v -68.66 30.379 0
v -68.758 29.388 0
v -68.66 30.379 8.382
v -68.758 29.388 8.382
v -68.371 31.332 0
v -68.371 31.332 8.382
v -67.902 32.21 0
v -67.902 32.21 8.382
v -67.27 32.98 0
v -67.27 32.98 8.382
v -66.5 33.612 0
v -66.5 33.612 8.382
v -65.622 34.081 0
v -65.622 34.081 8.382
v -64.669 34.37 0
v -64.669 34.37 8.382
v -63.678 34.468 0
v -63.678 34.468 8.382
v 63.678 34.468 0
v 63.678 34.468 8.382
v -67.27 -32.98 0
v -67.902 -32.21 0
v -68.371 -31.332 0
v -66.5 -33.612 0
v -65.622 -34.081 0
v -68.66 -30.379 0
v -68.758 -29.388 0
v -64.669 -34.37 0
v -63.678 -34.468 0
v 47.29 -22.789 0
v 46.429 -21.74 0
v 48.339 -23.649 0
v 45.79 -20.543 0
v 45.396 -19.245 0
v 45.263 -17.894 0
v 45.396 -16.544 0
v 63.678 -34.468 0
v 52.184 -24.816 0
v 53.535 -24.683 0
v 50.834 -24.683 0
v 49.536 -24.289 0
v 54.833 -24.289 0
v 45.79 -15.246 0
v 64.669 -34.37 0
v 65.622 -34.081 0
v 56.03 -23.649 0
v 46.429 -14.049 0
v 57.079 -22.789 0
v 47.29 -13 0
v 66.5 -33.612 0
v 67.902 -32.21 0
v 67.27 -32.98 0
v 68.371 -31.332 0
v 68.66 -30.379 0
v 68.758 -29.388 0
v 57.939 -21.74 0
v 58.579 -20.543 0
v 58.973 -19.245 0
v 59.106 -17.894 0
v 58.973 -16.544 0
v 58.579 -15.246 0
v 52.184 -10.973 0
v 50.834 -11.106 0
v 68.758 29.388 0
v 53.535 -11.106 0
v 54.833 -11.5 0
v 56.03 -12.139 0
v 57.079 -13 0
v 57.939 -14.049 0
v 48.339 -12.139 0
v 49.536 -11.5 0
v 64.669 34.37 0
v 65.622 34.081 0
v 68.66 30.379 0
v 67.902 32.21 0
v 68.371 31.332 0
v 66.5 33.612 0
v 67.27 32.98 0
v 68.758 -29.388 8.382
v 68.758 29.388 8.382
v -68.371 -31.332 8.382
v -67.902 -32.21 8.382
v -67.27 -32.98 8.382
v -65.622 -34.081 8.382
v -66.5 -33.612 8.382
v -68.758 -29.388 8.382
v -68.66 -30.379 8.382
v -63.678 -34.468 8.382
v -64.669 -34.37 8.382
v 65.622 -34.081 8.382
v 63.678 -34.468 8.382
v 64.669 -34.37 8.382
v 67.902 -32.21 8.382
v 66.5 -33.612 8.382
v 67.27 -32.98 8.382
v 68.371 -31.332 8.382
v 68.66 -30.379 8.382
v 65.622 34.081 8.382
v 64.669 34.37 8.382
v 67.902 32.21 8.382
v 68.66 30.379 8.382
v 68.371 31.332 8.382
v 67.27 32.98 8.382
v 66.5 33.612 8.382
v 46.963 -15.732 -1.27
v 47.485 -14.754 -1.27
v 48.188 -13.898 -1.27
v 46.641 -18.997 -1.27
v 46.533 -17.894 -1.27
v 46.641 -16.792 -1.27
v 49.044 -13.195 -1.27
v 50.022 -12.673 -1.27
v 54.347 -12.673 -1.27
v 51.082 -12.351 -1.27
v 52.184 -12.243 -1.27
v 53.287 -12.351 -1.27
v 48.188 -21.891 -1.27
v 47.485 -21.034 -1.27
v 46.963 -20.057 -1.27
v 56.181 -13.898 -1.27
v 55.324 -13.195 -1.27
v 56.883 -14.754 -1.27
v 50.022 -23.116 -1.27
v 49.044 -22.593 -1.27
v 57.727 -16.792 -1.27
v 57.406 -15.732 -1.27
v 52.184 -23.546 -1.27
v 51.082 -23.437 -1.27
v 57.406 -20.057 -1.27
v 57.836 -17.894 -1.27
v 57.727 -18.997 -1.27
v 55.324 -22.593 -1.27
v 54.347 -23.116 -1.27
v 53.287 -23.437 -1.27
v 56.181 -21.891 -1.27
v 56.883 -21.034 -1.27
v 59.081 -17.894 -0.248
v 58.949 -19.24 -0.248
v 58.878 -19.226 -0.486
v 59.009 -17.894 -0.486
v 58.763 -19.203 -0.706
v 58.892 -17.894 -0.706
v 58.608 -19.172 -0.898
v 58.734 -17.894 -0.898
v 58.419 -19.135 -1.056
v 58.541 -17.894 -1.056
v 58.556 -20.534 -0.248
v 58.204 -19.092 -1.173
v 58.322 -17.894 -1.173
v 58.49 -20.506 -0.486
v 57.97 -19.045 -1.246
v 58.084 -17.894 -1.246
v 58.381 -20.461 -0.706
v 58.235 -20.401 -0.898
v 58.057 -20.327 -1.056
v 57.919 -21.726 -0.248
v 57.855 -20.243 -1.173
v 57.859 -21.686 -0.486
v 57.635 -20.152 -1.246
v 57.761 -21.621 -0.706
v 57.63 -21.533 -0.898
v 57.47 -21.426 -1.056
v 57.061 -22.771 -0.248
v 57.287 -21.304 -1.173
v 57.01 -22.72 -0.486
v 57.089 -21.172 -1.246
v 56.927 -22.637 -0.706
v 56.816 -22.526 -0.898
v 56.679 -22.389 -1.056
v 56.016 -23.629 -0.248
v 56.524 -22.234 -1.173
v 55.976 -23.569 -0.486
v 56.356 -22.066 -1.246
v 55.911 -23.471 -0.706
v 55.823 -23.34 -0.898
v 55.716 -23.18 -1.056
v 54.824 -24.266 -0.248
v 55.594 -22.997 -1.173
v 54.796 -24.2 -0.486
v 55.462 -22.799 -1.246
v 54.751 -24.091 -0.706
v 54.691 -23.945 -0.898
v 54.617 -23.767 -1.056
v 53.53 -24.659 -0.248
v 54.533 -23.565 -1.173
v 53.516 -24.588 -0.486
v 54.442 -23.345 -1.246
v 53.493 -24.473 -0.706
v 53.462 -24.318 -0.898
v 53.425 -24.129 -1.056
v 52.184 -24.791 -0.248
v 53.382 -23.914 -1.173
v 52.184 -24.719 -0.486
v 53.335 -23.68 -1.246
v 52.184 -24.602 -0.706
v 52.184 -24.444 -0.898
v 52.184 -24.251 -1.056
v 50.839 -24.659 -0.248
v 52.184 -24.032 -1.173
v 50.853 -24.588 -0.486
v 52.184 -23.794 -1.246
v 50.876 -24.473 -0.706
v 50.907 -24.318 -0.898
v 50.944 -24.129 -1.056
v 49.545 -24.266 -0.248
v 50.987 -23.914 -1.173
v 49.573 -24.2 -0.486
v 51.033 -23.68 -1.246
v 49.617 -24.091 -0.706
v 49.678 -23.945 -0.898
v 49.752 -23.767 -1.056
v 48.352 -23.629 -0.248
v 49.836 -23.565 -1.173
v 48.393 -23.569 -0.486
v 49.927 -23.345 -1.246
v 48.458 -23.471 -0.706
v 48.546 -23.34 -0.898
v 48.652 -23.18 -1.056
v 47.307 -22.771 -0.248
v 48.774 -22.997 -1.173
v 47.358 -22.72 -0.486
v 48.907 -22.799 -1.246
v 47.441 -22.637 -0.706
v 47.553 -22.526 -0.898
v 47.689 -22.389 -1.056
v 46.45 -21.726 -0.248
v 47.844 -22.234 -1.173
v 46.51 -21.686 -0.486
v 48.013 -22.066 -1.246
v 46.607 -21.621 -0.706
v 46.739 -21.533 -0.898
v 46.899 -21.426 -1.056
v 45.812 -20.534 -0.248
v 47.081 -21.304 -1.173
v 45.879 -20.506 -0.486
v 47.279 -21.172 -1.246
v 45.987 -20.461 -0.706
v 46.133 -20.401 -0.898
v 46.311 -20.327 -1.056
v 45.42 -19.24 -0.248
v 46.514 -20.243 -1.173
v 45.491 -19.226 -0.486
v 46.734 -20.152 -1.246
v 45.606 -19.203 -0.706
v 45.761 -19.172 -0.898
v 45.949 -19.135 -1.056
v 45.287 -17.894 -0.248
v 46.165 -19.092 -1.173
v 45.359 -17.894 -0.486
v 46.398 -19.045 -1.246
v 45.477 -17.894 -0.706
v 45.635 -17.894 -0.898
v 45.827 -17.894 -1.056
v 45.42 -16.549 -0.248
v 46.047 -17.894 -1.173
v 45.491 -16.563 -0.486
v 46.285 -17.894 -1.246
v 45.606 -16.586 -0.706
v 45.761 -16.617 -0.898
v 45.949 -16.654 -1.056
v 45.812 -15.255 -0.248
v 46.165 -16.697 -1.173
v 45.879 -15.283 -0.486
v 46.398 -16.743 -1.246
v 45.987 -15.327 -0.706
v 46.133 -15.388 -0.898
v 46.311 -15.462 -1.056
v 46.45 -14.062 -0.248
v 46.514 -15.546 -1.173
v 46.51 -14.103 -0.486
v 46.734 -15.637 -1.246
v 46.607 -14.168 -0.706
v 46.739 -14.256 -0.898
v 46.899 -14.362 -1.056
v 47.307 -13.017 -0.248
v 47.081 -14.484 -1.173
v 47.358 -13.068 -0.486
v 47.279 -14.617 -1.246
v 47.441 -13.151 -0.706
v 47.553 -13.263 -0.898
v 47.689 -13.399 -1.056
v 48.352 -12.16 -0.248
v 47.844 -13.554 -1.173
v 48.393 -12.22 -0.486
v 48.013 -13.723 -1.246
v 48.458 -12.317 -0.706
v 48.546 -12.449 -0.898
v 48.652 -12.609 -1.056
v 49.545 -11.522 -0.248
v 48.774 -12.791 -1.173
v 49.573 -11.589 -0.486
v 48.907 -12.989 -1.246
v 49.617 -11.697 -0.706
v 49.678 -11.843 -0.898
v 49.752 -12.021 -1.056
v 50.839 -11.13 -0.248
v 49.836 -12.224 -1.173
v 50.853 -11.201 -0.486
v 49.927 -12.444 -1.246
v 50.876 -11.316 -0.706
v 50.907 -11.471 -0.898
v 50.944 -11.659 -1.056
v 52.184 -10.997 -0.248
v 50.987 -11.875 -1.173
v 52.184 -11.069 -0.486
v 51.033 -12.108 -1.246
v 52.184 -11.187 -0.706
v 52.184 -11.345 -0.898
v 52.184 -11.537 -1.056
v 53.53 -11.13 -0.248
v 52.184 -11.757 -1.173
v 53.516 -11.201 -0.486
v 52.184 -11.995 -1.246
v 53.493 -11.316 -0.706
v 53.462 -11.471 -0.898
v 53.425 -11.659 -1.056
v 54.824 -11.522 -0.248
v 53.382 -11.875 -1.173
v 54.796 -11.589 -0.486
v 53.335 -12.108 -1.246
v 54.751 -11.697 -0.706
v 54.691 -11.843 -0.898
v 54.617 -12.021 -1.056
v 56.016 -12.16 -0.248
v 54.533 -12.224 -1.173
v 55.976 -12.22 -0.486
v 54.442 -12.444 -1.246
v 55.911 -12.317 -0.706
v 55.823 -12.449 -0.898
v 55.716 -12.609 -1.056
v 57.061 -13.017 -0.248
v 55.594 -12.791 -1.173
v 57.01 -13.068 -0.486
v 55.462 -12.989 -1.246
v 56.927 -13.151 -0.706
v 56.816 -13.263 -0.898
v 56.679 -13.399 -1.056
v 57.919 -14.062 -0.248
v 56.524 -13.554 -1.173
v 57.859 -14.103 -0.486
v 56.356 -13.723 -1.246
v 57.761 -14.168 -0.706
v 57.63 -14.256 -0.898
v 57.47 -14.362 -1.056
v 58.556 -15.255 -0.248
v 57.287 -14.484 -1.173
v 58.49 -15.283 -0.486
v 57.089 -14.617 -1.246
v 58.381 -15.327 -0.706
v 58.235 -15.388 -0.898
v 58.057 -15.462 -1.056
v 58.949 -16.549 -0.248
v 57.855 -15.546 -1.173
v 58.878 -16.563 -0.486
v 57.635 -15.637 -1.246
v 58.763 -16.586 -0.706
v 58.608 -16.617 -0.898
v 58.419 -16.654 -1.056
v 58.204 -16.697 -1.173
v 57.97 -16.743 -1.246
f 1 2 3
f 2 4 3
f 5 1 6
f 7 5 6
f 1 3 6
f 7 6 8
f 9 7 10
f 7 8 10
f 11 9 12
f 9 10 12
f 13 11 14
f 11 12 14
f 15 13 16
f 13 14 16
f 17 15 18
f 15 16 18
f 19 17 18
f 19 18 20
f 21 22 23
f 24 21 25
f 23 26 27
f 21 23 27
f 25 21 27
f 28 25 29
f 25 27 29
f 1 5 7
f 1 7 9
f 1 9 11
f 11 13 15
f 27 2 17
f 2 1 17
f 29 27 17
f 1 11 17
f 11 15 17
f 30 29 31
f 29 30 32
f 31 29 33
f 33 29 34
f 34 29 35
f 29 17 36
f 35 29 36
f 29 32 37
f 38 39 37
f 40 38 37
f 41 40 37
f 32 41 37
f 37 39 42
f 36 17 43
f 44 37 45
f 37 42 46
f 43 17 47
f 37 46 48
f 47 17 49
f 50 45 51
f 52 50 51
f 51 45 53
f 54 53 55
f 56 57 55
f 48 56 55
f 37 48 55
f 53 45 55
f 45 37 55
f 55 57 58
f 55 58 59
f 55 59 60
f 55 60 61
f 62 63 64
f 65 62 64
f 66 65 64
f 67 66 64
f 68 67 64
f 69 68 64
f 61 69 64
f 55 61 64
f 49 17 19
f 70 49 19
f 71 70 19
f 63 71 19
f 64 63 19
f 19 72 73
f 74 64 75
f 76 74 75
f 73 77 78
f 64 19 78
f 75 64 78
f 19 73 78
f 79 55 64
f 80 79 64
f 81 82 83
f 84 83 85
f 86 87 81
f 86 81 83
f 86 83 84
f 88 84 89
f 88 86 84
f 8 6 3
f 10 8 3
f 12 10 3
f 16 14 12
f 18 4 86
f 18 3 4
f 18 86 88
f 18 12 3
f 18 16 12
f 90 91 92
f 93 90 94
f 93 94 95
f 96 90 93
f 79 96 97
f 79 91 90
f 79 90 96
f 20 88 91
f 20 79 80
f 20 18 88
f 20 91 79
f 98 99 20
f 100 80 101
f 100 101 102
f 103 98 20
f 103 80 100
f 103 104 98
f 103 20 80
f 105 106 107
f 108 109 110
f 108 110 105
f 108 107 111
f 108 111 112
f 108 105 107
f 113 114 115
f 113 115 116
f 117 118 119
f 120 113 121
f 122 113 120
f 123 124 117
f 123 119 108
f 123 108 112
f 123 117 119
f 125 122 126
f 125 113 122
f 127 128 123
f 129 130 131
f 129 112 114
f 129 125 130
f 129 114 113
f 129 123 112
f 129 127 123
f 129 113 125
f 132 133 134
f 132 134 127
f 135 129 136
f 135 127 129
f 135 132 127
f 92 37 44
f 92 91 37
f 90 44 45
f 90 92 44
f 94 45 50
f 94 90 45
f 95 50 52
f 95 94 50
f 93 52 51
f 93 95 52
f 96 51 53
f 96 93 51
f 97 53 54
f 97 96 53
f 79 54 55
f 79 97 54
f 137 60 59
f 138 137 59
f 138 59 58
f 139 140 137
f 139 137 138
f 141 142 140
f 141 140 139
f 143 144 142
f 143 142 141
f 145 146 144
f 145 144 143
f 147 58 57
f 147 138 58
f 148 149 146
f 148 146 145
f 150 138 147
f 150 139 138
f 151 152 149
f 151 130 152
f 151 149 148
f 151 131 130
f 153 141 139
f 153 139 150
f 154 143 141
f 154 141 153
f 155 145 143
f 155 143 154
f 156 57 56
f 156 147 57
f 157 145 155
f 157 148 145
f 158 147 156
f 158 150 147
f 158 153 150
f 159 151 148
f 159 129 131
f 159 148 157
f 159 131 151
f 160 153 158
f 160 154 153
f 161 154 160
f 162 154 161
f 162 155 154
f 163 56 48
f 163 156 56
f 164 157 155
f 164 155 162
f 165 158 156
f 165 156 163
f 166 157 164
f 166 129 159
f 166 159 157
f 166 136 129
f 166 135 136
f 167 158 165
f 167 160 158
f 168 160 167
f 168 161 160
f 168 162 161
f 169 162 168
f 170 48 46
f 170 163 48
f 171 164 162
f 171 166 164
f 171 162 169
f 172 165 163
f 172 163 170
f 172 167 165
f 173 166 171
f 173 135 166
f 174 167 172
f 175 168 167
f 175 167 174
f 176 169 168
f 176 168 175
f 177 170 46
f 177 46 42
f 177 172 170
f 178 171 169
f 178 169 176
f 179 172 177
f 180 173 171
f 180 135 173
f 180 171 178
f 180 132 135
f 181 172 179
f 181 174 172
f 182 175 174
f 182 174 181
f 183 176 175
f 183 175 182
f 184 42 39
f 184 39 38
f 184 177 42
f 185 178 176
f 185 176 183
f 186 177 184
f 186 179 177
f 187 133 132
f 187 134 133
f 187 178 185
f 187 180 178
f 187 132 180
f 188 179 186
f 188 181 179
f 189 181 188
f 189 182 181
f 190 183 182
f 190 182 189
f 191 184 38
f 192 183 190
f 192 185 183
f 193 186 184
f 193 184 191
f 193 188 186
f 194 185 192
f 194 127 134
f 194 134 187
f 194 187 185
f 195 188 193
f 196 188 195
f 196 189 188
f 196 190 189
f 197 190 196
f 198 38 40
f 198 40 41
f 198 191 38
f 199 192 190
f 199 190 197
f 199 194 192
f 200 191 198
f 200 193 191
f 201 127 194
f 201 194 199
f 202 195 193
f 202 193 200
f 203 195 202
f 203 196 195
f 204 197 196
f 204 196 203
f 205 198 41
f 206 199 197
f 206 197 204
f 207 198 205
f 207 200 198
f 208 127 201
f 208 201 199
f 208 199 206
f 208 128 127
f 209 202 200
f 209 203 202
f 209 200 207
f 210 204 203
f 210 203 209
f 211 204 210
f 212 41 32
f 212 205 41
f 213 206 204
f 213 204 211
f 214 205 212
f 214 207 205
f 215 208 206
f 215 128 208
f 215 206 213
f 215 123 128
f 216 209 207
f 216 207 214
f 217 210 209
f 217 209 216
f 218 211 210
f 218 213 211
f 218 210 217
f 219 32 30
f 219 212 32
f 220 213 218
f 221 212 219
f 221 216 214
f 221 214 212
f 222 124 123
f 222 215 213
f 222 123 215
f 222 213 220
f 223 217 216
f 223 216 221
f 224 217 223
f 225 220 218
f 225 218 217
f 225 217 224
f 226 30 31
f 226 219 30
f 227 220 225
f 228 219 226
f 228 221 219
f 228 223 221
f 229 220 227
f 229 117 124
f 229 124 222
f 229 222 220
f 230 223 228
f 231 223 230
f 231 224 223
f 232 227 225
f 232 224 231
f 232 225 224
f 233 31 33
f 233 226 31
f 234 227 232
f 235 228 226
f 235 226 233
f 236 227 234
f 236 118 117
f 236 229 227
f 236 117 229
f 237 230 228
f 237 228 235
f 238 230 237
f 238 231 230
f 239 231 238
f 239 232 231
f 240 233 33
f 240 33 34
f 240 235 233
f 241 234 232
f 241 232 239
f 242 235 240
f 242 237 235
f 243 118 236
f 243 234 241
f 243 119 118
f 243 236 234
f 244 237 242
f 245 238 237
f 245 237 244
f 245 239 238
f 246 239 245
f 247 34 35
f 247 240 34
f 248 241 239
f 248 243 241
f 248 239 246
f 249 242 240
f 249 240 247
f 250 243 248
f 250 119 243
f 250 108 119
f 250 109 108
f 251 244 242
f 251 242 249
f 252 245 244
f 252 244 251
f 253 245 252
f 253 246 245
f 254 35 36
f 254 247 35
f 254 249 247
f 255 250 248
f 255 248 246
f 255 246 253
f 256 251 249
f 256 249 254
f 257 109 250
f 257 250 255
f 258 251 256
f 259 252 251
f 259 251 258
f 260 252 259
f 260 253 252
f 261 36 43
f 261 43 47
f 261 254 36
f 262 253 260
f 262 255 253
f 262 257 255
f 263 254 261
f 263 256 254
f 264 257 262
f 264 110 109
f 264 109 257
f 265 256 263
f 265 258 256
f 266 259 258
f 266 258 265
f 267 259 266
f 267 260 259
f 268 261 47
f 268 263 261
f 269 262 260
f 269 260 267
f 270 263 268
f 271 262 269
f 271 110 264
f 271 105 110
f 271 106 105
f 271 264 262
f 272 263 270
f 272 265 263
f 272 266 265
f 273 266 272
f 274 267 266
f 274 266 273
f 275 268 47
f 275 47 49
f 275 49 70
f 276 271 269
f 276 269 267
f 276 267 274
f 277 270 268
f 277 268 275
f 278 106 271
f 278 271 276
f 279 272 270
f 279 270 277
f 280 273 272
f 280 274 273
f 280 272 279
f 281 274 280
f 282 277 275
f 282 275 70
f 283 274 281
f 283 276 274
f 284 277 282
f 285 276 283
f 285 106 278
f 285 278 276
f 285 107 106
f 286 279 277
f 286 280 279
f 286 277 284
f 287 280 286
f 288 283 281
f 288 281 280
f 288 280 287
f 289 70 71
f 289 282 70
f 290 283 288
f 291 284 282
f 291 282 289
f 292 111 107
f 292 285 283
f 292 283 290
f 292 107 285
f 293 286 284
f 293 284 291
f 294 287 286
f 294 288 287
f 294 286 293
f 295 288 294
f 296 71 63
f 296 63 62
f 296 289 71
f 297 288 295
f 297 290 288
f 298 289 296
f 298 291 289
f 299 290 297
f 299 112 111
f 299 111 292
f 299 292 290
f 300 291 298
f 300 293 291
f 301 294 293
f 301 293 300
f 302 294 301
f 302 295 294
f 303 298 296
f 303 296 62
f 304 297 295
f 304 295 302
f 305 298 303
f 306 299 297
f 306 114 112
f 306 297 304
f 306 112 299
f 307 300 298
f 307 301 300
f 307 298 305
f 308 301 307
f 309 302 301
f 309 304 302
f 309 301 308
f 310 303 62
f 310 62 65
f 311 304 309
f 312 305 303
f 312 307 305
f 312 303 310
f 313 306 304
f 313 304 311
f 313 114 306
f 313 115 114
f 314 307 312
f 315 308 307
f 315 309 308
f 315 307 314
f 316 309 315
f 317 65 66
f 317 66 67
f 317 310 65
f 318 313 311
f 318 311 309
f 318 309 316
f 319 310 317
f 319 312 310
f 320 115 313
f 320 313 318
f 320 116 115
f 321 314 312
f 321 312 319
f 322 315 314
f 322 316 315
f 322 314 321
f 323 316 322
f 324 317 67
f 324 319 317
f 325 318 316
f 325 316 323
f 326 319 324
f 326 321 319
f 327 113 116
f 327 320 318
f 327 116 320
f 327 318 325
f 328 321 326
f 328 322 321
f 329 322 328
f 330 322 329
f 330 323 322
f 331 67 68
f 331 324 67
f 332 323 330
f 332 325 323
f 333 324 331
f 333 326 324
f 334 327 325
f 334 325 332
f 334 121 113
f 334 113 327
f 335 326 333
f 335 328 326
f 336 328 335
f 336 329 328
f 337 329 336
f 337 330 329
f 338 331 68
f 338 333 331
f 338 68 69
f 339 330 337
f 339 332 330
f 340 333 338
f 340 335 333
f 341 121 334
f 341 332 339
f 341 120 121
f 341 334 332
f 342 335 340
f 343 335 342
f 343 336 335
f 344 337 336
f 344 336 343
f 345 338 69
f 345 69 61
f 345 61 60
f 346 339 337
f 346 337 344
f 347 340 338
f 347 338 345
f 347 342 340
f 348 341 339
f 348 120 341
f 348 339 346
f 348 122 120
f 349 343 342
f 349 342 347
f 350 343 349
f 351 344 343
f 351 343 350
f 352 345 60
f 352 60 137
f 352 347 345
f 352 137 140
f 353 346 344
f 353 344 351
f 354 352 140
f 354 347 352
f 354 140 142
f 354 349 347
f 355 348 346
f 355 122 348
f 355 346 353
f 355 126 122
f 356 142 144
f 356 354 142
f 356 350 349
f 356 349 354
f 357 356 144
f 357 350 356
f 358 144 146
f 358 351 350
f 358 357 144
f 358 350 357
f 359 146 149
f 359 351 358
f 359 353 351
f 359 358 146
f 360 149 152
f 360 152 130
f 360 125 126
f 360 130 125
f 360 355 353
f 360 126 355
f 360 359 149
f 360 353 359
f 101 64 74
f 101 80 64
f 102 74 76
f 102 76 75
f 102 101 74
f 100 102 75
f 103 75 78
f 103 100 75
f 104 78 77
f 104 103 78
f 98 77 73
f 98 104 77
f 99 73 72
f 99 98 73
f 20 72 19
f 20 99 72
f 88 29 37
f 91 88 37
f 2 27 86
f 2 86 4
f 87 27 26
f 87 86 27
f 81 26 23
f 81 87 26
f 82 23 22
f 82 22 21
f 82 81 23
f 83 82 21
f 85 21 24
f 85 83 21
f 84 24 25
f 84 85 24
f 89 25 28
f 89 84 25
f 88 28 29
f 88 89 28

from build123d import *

# Parameters (mm, degrees)
F0_W     = 137.5156
F0_H     = 68.9356
F1_DEPTH = 8.382
F2_R     = 5.08
F3_R     = 6.9215
F4_DEPTH = 1.27
F5_R     = 1.26999


# Not quite as in the source:
# - a fillet or chamfer is up to 0.001 mm smaller than in the source, because OpenCascade refuses the exact size


with BuildPart() as f1:
    # F0 (on Top) → F1 (new body)
    with BuildSketch(Plane.XY):
        Rectangle(F0_W, F0_H)
    extrude(amount=F1_DEPTH)

    # F2
    f2_edges = [f1.edges().sort_by_distance(p)[0] for p in [
        (-68.7578, 34.4678, 4.191),
        (-68.7578, -34.4678, 4.191),
        (68.7578, -34.4678, 4.191),
        (68.7578, 34.4678, 4.191),
    ]]
    fillet(f2_edges, radius=F2_R)

    # F3 (on face) → F4 (join)
    with BuildSketch(Plane(origin=(0, 0, 0), x_dir=(1, 0, 0), z_dir=(0, 0, -1))):
        with Locations((52.1843, 17.8943)):
            Circle(F3_R)
    extrude(amount=F4_DEPTH)

    # F5 (radius 1.27 in the source; OpenCascade refuses exactly that, so slightly less here)
    f5_edges = [f1.edges().sort_by_distance(p)[0] for p in [
        (45.2628, -17.8943, -1.27),
    ]]
    fillet(f5_edges, radius=F5_R)


solid = f1.part
